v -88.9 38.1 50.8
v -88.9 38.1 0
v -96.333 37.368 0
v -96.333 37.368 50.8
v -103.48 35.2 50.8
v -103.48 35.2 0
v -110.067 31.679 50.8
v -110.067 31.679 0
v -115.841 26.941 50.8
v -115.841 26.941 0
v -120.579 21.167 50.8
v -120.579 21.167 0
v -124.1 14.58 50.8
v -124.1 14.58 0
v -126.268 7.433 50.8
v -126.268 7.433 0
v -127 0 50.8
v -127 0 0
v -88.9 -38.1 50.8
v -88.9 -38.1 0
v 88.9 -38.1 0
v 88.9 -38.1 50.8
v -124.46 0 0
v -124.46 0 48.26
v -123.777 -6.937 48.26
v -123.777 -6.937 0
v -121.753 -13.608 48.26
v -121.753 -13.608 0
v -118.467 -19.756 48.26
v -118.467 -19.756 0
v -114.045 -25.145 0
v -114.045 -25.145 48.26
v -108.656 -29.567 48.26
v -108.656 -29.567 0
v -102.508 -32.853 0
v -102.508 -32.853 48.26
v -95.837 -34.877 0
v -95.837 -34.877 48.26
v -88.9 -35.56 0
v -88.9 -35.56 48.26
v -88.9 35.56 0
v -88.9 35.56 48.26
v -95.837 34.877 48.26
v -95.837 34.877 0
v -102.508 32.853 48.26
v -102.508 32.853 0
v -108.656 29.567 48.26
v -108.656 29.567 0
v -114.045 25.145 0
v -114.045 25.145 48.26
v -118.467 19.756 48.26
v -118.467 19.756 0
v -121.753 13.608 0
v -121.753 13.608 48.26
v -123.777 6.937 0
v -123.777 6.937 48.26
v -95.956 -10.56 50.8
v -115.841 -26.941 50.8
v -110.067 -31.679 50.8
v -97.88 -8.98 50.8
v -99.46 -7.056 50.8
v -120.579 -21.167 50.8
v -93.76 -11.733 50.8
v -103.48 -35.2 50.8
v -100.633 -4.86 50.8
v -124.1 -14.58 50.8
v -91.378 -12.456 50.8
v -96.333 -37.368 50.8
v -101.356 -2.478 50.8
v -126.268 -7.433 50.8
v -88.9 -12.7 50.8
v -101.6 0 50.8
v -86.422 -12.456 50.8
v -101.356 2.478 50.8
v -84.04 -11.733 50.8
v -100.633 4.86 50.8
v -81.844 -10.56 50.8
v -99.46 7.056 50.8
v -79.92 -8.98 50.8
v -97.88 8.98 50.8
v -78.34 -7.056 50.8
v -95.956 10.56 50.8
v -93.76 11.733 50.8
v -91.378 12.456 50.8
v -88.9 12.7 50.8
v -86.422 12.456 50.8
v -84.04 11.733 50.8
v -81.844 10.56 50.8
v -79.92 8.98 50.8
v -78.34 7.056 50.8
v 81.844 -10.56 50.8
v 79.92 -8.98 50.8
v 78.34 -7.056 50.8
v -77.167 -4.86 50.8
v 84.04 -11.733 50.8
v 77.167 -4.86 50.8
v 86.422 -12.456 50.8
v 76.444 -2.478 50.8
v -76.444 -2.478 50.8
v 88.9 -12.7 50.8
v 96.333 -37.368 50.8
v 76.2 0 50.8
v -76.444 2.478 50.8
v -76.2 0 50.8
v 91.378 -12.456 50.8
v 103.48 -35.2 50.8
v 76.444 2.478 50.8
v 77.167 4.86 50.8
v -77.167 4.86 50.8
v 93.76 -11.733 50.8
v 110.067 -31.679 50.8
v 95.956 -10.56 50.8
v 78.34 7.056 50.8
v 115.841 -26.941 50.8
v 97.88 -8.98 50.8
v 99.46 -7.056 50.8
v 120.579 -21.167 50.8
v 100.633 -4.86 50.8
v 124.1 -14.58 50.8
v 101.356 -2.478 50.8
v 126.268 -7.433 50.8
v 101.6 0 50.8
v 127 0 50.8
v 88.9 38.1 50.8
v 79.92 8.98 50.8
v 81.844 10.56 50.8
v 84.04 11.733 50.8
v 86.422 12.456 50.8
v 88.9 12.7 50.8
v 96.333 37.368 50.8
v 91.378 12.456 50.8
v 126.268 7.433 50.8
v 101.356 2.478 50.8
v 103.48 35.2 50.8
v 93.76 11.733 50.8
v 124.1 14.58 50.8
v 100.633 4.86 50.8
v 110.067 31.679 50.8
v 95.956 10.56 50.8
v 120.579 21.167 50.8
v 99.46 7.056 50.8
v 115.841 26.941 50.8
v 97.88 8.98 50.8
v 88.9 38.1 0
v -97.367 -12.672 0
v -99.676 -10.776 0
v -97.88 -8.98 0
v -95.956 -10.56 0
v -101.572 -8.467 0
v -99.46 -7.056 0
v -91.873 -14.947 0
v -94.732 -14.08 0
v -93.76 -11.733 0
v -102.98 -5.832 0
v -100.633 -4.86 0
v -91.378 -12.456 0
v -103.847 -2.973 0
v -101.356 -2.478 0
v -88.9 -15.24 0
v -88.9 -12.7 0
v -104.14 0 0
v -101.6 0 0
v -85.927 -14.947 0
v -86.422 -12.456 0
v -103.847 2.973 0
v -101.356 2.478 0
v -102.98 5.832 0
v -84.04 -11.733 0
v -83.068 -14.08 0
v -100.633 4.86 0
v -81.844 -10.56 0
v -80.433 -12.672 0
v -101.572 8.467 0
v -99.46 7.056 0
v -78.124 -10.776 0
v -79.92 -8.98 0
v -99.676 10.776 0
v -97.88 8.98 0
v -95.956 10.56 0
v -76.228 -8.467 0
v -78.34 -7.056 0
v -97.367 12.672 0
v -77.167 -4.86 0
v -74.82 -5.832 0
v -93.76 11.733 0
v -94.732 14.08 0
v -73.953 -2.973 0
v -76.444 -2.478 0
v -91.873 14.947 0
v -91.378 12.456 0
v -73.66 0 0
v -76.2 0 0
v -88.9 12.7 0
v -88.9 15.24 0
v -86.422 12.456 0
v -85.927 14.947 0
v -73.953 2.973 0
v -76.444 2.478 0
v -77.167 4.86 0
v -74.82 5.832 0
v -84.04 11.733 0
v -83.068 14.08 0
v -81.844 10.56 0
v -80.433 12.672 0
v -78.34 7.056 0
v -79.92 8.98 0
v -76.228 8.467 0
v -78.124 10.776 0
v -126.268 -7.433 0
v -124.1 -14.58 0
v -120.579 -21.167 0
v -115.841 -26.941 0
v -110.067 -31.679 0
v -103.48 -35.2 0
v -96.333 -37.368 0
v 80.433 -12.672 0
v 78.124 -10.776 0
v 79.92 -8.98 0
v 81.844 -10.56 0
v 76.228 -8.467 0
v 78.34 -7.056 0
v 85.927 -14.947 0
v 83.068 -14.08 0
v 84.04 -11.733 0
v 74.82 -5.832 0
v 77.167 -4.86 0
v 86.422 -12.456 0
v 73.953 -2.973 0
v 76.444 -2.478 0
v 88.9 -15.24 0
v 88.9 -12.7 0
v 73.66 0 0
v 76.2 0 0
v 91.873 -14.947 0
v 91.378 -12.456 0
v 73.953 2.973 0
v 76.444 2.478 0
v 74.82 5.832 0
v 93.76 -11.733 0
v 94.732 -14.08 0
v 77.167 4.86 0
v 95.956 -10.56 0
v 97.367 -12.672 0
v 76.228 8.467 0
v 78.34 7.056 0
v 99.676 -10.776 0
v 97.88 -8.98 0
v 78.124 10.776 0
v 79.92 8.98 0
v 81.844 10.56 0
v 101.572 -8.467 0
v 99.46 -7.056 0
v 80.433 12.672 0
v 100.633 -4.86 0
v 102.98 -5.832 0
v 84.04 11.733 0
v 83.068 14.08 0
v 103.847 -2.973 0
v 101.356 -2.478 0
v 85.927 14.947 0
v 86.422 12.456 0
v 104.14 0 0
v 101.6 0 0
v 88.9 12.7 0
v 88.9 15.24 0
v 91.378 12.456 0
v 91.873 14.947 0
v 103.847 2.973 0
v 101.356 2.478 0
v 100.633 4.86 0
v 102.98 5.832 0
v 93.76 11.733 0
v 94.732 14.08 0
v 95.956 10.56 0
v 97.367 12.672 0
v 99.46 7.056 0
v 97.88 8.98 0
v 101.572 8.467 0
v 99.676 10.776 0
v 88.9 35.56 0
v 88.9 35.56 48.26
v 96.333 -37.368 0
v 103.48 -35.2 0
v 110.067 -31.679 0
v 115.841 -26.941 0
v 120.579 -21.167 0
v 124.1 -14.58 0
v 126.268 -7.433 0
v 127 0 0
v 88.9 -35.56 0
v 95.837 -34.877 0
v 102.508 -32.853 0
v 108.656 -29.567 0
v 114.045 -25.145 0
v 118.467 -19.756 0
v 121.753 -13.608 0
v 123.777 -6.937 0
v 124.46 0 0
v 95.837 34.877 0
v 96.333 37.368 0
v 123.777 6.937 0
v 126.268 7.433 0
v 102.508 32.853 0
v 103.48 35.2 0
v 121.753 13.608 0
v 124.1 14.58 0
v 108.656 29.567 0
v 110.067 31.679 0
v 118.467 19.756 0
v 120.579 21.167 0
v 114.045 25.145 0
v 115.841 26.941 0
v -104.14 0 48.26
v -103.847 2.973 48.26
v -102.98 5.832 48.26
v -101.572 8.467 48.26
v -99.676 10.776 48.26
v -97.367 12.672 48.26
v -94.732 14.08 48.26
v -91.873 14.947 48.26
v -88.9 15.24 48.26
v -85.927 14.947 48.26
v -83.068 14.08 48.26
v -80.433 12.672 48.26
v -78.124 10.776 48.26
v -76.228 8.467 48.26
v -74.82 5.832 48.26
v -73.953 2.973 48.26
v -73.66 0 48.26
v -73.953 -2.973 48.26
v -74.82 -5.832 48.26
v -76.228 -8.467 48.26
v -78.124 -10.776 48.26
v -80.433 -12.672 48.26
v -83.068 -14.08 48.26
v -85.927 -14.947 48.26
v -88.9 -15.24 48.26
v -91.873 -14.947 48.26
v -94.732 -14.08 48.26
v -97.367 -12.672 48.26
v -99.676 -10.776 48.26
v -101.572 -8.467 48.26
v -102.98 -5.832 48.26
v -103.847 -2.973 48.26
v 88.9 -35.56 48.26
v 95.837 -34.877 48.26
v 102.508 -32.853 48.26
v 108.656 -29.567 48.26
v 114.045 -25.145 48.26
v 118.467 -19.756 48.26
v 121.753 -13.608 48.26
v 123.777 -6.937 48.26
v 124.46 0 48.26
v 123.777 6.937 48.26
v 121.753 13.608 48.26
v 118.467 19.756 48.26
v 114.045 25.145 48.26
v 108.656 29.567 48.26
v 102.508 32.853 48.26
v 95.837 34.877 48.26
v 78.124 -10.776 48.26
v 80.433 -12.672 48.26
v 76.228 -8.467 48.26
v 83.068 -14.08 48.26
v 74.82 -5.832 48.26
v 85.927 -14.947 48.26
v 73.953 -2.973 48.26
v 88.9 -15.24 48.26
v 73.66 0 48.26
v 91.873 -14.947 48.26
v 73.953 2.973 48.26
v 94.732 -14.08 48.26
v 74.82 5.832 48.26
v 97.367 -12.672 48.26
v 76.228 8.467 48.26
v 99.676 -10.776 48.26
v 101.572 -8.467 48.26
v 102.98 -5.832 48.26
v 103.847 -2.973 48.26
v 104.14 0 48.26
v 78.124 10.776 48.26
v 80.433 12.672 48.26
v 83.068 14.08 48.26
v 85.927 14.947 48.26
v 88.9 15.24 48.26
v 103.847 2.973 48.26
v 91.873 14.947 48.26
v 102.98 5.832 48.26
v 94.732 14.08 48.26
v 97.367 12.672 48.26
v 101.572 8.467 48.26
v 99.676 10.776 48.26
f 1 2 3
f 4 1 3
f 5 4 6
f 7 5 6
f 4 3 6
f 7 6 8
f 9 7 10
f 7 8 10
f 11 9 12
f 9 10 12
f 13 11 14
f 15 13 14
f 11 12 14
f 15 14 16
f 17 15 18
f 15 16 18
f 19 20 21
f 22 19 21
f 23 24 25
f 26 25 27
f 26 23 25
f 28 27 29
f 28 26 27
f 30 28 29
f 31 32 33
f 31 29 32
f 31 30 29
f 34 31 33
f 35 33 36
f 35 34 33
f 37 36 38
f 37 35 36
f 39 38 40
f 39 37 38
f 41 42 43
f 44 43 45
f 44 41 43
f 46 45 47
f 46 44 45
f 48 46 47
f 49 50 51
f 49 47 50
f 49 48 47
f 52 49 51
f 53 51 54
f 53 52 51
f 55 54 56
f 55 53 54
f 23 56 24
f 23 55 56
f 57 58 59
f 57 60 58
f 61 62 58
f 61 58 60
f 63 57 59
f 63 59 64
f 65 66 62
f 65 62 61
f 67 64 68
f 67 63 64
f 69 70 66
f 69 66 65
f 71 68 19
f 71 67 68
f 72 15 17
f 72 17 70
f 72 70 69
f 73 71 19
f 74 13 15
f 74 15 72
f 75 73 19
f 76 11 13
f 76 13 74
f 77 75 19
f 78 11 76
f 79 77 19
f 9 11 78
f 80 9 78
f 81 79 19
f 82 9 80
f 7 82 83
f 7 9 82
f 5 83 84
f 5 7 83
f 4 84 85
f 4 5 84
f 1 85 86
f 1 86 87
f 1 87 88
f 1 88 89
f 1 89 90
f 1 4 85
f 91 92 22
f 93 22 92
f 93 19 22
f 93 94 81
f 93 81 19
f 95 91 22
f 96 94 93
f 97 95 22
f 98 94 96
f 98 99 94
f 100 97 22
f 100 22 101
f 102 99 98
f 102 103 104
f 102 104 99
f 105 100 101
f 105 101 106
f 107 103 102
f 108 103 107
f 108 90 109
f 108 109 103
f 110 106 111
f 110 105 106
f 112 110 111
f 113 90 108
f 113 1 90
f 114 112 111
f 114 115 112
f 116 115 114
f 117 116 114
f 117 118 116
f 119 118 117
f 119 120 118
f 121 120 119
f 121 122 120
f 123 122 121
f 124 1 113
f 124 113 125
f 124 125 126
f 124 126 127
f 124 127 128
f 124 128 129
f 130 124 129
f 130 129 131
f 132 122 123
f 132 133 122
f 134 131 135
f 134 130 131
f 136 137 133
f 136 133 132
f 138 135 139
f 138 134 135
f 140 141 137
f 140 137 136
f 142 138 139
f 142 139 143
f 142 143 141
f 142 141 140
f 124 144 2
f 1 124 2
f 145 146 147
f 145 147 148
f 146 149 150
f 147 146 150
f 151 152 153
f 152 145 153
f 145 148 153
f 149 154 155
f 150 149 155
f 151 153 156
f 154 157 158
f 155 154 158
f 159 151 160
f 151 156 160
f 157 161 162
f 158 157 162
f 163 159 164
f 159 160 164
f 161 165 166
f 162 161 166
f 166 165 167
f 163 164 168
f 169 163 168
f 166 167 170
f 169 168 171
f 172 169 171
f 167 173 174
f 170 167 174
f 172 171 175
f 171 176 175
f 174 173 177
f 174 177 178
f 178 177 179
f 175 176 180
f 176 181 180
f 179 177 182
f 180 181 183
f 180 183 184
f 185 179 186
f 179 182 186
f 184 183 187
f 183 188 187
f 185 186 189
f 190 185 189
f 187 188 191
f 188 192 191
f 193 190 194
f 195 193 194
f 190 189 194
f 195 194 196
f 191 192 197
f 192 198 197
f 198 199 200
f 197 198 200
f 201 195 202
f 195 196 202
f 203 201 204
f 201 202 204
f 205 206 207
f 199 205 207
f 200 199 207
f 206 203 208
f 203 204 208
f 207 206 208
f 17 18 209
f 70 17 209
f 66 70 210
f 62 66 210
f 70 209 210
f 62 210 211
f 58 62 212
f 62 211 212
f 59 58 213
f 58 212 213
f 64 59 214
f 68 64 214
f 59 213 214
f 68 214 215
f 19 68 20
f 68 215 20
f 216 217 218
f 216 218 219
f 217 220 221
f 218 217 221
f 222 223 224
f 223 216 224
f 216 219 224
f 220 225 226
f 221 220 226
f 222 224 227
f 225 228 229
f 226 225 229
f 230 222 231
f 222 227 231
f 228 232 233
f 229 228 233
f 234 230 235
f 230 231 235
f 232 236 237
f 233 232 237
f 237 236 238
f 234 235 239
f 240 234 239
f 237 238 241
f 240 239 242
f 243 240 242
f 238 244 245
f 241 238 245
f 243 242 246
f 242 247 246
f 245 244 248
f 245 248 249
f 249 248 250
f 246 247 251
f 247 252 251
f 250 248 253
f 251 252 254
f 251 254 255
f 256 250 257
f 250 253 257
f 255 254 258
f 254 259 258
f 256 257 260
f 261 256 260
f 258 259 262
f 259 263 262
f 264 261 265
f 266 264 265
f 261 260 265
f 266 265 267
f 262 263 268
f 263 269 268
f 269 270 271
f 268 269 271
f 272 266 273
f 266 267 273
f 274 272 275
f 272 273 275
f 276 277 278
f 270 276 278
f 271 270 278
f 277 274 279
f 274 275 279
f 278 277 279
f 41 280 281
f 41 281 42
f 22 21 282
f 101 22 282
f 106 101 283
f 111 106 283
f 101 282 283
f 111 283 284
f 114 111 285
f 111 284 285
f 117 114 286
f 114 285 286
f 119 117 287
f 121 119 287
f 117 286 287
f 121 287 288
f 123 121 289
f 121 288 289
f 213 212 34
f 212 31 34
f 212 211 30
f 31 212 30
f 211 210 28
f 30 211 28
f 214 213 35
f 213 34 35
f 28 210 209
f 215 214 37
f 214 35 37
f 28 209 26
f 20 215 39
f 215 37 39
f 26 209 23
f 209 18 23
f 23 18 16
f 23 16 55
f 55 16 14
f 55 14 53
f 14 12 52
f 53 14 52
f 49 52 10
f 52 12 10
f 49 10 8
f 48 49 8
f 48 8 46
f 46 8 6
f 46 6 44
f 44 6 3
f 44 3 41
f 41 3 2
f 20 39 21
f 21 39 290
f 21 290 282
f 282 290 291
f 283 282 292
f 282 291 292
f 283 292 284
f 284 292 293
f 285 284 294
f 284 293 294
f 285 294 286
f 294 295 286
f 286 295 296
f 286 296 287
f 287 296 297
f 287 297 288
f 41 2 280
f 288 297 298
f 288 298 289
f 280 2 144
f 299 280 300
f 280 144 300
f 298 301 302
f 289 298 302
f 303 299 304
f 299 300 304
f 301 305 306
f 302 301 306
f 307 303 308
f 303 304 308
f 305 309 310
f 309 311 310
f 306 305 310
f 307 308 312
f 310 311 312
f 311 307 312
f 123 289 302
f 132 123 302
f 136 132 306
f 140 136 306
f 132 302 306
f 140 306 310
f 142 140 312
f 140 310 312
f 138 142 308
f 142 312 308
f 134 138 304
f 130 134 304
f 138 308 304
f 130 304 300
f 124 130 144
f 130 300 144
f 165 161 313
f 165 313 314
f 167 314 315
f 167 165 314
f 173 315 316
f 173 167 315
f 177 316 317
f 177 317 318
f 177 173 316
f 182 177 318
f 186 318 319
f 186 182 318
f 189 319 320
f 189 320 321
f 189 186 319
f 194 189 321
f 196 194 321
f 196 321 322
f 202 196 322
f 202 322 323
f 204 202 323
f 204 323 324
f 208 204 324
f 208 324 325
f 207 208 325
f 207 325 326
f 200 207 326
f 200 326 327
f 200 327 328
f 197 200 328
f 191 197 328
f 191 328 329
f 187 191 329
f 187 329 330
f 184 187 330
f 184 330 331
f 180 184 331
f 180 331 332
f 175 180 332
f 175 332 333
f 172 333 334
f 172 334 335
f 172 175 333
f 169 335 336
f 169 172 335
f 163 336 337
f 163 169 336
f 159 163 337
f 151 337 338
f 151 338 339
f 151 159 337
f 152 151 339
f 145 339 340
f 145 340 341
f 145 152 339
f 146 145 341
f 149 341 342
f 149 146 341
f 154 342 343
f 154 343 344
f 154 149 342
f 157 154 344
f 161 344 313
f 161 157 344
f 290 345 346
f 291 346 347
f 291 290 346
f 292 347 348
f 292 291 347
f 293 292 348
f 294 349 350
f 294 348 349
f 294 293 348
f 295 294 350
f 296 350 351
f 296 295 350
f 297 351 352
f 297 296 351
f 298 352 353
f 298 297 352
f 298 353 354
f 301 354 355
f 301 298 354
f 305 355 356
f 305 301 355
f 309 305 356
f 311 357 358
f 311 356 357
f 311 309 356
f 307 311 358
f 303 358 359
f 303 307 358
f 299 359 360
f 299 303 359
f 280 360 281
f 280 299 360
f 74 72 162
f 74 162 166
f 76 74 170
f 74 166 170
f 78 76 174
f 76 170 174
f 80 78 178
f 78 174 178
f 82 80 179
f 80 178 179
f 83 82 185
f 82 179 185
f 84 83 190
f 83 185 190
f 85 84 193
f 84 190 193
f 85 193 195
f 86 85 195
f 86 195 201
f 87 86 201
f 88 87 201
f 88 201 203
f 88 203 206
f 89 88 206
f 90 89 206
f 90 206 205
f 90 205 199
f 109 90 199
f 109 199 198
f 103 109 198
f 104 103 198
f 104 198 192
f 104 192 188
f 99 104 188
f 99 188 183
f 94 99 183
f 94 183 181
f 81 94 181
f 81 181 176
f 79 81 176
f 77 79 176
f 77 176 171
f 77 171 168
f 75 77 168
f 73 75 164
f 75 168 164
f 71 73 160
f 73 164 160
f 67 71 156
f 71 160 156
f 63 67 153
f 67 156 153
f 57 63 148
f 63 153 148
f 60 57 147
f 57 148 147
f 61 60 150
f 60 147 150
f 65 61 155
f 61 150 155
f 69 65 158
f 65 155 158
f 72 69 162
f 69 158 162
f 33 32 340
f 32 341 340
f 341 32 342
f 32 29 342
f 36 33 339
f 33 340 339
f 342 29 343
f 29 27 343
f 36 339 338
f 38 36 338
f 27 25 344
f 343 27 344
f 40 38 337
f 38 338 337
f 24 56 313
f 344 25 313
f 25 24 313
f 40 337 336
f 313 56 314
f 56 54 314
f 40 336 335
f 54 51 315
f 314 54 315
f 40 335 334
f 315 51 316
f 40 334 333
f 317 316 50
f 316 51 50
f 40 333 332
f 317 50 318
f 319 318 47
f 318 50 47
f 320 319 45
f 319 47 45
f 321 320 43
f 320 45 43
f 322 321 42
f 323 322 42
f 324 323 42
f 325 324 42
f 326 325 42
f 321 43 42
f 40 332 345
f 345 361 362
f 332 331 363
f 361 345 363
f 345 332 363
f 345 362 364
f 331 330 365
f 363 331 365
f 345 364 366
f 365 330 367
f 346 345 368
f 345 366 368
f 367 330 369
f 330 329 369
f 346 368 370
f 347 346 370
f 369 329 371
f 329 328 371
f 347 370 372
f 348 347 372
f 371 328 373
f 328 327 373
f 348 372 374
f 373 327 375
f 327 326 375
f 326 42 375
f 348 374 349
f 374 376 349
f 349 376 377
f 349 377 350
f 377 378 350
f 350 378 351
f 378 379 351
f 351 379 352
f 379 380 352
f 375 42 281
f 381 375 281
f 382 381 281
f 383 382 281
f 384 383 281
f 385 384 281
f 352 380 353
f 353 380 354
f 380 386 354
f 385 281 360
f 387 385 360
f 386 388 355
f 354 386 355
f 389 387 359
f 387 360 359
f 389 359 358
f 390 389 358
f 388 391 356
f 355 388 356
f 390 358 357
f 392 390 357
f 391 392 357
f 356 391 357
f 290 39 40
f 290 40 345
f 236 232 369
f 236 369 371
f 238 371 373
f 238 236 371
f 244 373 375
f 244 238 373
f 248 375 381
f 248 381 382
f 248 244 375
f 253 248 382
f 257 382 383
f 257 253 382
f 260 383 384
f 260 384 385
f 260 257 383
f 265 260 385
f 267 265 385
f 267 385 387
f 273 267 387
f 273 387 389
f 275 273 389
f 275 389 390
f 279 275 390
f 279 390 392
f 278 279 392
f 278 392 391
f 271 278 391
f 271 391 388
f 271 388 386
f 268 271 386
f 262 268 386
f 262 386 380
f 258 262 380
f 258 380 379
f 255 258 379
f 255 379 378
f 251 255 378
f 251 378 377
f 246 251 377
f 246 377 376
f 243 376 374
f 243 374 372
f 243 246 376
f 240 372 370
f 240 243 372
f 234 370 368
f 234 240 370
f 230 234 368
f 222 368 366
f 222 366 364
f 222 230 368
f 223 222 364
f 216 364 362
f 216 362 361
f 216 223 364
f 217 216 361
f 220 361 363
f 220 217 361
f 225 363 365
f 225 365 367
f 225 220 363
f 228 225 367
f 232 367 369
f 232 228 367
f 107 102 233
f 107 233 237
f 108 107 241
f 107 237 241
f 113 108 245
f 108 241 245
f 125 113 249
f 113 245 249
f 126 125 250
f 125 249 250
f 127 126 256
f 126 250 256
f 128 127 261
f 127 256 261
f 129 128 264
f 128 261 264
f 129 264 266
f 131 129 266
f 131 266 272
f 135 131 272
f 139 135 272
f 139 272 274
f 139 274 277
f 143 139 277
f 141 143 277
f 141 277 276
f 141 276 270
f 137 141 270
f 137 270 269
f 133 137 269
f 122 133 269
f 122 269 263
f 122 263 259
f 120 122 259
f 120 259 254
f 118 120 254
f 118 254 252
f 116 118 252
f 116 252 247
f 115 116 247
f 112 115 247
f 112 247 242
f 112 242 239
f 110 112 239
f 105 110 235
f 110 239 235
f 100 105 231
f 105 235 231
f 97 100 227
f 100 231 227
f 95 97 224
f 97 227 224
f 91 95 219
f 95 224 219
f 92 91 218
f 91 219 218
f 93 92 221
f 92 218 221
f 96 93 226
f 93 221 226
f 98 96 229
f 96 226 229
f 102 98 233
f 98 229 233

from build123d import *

# Parameters (mm, degrees)
F1_DEPTH = 50.8
F3_D     = 25.4
F4_T     = -2.54


with BuildPart() as f1:
    # F0 (on Top) → F1 (new body)
    with BuildSketch(Plane.XY):
        with BuildLine():
            Line((88.9, 38.1), (-88.9, 38.1))
            ThreePointArc((-88.9, 38.1), (-115.840768, 26.940768), (-127, 0))
            ThreePointArc((-127, 0), (-115.840768, -26.940768), (-88.9, -38.1))
            Line((-88.9, -38.1), (88.9, -38.1))
            ThreePointArc((88.9, -38.1), (115.840768, -26.940768), (127, 0))
            ThreePointArc((127, 0), (115.840768, 26.940768), (88.9, 38.1))
        make_face()
    extrude(amount=F1_DEPTH)

    # F3 (through all)
    with Locations(Plane.XY.offset(50.8)):
        with Locations((-88.9, 0), (88.9, 0)):
            Hole(F3_D / 2)

    # F4
    f4_openings = [f1.faces().sort_by_distance(p)[0] for p in [
        (0, 0, 0),
    ]]
    offset(amount=F4_T, openings=f4_openings)


solid = f1.part
